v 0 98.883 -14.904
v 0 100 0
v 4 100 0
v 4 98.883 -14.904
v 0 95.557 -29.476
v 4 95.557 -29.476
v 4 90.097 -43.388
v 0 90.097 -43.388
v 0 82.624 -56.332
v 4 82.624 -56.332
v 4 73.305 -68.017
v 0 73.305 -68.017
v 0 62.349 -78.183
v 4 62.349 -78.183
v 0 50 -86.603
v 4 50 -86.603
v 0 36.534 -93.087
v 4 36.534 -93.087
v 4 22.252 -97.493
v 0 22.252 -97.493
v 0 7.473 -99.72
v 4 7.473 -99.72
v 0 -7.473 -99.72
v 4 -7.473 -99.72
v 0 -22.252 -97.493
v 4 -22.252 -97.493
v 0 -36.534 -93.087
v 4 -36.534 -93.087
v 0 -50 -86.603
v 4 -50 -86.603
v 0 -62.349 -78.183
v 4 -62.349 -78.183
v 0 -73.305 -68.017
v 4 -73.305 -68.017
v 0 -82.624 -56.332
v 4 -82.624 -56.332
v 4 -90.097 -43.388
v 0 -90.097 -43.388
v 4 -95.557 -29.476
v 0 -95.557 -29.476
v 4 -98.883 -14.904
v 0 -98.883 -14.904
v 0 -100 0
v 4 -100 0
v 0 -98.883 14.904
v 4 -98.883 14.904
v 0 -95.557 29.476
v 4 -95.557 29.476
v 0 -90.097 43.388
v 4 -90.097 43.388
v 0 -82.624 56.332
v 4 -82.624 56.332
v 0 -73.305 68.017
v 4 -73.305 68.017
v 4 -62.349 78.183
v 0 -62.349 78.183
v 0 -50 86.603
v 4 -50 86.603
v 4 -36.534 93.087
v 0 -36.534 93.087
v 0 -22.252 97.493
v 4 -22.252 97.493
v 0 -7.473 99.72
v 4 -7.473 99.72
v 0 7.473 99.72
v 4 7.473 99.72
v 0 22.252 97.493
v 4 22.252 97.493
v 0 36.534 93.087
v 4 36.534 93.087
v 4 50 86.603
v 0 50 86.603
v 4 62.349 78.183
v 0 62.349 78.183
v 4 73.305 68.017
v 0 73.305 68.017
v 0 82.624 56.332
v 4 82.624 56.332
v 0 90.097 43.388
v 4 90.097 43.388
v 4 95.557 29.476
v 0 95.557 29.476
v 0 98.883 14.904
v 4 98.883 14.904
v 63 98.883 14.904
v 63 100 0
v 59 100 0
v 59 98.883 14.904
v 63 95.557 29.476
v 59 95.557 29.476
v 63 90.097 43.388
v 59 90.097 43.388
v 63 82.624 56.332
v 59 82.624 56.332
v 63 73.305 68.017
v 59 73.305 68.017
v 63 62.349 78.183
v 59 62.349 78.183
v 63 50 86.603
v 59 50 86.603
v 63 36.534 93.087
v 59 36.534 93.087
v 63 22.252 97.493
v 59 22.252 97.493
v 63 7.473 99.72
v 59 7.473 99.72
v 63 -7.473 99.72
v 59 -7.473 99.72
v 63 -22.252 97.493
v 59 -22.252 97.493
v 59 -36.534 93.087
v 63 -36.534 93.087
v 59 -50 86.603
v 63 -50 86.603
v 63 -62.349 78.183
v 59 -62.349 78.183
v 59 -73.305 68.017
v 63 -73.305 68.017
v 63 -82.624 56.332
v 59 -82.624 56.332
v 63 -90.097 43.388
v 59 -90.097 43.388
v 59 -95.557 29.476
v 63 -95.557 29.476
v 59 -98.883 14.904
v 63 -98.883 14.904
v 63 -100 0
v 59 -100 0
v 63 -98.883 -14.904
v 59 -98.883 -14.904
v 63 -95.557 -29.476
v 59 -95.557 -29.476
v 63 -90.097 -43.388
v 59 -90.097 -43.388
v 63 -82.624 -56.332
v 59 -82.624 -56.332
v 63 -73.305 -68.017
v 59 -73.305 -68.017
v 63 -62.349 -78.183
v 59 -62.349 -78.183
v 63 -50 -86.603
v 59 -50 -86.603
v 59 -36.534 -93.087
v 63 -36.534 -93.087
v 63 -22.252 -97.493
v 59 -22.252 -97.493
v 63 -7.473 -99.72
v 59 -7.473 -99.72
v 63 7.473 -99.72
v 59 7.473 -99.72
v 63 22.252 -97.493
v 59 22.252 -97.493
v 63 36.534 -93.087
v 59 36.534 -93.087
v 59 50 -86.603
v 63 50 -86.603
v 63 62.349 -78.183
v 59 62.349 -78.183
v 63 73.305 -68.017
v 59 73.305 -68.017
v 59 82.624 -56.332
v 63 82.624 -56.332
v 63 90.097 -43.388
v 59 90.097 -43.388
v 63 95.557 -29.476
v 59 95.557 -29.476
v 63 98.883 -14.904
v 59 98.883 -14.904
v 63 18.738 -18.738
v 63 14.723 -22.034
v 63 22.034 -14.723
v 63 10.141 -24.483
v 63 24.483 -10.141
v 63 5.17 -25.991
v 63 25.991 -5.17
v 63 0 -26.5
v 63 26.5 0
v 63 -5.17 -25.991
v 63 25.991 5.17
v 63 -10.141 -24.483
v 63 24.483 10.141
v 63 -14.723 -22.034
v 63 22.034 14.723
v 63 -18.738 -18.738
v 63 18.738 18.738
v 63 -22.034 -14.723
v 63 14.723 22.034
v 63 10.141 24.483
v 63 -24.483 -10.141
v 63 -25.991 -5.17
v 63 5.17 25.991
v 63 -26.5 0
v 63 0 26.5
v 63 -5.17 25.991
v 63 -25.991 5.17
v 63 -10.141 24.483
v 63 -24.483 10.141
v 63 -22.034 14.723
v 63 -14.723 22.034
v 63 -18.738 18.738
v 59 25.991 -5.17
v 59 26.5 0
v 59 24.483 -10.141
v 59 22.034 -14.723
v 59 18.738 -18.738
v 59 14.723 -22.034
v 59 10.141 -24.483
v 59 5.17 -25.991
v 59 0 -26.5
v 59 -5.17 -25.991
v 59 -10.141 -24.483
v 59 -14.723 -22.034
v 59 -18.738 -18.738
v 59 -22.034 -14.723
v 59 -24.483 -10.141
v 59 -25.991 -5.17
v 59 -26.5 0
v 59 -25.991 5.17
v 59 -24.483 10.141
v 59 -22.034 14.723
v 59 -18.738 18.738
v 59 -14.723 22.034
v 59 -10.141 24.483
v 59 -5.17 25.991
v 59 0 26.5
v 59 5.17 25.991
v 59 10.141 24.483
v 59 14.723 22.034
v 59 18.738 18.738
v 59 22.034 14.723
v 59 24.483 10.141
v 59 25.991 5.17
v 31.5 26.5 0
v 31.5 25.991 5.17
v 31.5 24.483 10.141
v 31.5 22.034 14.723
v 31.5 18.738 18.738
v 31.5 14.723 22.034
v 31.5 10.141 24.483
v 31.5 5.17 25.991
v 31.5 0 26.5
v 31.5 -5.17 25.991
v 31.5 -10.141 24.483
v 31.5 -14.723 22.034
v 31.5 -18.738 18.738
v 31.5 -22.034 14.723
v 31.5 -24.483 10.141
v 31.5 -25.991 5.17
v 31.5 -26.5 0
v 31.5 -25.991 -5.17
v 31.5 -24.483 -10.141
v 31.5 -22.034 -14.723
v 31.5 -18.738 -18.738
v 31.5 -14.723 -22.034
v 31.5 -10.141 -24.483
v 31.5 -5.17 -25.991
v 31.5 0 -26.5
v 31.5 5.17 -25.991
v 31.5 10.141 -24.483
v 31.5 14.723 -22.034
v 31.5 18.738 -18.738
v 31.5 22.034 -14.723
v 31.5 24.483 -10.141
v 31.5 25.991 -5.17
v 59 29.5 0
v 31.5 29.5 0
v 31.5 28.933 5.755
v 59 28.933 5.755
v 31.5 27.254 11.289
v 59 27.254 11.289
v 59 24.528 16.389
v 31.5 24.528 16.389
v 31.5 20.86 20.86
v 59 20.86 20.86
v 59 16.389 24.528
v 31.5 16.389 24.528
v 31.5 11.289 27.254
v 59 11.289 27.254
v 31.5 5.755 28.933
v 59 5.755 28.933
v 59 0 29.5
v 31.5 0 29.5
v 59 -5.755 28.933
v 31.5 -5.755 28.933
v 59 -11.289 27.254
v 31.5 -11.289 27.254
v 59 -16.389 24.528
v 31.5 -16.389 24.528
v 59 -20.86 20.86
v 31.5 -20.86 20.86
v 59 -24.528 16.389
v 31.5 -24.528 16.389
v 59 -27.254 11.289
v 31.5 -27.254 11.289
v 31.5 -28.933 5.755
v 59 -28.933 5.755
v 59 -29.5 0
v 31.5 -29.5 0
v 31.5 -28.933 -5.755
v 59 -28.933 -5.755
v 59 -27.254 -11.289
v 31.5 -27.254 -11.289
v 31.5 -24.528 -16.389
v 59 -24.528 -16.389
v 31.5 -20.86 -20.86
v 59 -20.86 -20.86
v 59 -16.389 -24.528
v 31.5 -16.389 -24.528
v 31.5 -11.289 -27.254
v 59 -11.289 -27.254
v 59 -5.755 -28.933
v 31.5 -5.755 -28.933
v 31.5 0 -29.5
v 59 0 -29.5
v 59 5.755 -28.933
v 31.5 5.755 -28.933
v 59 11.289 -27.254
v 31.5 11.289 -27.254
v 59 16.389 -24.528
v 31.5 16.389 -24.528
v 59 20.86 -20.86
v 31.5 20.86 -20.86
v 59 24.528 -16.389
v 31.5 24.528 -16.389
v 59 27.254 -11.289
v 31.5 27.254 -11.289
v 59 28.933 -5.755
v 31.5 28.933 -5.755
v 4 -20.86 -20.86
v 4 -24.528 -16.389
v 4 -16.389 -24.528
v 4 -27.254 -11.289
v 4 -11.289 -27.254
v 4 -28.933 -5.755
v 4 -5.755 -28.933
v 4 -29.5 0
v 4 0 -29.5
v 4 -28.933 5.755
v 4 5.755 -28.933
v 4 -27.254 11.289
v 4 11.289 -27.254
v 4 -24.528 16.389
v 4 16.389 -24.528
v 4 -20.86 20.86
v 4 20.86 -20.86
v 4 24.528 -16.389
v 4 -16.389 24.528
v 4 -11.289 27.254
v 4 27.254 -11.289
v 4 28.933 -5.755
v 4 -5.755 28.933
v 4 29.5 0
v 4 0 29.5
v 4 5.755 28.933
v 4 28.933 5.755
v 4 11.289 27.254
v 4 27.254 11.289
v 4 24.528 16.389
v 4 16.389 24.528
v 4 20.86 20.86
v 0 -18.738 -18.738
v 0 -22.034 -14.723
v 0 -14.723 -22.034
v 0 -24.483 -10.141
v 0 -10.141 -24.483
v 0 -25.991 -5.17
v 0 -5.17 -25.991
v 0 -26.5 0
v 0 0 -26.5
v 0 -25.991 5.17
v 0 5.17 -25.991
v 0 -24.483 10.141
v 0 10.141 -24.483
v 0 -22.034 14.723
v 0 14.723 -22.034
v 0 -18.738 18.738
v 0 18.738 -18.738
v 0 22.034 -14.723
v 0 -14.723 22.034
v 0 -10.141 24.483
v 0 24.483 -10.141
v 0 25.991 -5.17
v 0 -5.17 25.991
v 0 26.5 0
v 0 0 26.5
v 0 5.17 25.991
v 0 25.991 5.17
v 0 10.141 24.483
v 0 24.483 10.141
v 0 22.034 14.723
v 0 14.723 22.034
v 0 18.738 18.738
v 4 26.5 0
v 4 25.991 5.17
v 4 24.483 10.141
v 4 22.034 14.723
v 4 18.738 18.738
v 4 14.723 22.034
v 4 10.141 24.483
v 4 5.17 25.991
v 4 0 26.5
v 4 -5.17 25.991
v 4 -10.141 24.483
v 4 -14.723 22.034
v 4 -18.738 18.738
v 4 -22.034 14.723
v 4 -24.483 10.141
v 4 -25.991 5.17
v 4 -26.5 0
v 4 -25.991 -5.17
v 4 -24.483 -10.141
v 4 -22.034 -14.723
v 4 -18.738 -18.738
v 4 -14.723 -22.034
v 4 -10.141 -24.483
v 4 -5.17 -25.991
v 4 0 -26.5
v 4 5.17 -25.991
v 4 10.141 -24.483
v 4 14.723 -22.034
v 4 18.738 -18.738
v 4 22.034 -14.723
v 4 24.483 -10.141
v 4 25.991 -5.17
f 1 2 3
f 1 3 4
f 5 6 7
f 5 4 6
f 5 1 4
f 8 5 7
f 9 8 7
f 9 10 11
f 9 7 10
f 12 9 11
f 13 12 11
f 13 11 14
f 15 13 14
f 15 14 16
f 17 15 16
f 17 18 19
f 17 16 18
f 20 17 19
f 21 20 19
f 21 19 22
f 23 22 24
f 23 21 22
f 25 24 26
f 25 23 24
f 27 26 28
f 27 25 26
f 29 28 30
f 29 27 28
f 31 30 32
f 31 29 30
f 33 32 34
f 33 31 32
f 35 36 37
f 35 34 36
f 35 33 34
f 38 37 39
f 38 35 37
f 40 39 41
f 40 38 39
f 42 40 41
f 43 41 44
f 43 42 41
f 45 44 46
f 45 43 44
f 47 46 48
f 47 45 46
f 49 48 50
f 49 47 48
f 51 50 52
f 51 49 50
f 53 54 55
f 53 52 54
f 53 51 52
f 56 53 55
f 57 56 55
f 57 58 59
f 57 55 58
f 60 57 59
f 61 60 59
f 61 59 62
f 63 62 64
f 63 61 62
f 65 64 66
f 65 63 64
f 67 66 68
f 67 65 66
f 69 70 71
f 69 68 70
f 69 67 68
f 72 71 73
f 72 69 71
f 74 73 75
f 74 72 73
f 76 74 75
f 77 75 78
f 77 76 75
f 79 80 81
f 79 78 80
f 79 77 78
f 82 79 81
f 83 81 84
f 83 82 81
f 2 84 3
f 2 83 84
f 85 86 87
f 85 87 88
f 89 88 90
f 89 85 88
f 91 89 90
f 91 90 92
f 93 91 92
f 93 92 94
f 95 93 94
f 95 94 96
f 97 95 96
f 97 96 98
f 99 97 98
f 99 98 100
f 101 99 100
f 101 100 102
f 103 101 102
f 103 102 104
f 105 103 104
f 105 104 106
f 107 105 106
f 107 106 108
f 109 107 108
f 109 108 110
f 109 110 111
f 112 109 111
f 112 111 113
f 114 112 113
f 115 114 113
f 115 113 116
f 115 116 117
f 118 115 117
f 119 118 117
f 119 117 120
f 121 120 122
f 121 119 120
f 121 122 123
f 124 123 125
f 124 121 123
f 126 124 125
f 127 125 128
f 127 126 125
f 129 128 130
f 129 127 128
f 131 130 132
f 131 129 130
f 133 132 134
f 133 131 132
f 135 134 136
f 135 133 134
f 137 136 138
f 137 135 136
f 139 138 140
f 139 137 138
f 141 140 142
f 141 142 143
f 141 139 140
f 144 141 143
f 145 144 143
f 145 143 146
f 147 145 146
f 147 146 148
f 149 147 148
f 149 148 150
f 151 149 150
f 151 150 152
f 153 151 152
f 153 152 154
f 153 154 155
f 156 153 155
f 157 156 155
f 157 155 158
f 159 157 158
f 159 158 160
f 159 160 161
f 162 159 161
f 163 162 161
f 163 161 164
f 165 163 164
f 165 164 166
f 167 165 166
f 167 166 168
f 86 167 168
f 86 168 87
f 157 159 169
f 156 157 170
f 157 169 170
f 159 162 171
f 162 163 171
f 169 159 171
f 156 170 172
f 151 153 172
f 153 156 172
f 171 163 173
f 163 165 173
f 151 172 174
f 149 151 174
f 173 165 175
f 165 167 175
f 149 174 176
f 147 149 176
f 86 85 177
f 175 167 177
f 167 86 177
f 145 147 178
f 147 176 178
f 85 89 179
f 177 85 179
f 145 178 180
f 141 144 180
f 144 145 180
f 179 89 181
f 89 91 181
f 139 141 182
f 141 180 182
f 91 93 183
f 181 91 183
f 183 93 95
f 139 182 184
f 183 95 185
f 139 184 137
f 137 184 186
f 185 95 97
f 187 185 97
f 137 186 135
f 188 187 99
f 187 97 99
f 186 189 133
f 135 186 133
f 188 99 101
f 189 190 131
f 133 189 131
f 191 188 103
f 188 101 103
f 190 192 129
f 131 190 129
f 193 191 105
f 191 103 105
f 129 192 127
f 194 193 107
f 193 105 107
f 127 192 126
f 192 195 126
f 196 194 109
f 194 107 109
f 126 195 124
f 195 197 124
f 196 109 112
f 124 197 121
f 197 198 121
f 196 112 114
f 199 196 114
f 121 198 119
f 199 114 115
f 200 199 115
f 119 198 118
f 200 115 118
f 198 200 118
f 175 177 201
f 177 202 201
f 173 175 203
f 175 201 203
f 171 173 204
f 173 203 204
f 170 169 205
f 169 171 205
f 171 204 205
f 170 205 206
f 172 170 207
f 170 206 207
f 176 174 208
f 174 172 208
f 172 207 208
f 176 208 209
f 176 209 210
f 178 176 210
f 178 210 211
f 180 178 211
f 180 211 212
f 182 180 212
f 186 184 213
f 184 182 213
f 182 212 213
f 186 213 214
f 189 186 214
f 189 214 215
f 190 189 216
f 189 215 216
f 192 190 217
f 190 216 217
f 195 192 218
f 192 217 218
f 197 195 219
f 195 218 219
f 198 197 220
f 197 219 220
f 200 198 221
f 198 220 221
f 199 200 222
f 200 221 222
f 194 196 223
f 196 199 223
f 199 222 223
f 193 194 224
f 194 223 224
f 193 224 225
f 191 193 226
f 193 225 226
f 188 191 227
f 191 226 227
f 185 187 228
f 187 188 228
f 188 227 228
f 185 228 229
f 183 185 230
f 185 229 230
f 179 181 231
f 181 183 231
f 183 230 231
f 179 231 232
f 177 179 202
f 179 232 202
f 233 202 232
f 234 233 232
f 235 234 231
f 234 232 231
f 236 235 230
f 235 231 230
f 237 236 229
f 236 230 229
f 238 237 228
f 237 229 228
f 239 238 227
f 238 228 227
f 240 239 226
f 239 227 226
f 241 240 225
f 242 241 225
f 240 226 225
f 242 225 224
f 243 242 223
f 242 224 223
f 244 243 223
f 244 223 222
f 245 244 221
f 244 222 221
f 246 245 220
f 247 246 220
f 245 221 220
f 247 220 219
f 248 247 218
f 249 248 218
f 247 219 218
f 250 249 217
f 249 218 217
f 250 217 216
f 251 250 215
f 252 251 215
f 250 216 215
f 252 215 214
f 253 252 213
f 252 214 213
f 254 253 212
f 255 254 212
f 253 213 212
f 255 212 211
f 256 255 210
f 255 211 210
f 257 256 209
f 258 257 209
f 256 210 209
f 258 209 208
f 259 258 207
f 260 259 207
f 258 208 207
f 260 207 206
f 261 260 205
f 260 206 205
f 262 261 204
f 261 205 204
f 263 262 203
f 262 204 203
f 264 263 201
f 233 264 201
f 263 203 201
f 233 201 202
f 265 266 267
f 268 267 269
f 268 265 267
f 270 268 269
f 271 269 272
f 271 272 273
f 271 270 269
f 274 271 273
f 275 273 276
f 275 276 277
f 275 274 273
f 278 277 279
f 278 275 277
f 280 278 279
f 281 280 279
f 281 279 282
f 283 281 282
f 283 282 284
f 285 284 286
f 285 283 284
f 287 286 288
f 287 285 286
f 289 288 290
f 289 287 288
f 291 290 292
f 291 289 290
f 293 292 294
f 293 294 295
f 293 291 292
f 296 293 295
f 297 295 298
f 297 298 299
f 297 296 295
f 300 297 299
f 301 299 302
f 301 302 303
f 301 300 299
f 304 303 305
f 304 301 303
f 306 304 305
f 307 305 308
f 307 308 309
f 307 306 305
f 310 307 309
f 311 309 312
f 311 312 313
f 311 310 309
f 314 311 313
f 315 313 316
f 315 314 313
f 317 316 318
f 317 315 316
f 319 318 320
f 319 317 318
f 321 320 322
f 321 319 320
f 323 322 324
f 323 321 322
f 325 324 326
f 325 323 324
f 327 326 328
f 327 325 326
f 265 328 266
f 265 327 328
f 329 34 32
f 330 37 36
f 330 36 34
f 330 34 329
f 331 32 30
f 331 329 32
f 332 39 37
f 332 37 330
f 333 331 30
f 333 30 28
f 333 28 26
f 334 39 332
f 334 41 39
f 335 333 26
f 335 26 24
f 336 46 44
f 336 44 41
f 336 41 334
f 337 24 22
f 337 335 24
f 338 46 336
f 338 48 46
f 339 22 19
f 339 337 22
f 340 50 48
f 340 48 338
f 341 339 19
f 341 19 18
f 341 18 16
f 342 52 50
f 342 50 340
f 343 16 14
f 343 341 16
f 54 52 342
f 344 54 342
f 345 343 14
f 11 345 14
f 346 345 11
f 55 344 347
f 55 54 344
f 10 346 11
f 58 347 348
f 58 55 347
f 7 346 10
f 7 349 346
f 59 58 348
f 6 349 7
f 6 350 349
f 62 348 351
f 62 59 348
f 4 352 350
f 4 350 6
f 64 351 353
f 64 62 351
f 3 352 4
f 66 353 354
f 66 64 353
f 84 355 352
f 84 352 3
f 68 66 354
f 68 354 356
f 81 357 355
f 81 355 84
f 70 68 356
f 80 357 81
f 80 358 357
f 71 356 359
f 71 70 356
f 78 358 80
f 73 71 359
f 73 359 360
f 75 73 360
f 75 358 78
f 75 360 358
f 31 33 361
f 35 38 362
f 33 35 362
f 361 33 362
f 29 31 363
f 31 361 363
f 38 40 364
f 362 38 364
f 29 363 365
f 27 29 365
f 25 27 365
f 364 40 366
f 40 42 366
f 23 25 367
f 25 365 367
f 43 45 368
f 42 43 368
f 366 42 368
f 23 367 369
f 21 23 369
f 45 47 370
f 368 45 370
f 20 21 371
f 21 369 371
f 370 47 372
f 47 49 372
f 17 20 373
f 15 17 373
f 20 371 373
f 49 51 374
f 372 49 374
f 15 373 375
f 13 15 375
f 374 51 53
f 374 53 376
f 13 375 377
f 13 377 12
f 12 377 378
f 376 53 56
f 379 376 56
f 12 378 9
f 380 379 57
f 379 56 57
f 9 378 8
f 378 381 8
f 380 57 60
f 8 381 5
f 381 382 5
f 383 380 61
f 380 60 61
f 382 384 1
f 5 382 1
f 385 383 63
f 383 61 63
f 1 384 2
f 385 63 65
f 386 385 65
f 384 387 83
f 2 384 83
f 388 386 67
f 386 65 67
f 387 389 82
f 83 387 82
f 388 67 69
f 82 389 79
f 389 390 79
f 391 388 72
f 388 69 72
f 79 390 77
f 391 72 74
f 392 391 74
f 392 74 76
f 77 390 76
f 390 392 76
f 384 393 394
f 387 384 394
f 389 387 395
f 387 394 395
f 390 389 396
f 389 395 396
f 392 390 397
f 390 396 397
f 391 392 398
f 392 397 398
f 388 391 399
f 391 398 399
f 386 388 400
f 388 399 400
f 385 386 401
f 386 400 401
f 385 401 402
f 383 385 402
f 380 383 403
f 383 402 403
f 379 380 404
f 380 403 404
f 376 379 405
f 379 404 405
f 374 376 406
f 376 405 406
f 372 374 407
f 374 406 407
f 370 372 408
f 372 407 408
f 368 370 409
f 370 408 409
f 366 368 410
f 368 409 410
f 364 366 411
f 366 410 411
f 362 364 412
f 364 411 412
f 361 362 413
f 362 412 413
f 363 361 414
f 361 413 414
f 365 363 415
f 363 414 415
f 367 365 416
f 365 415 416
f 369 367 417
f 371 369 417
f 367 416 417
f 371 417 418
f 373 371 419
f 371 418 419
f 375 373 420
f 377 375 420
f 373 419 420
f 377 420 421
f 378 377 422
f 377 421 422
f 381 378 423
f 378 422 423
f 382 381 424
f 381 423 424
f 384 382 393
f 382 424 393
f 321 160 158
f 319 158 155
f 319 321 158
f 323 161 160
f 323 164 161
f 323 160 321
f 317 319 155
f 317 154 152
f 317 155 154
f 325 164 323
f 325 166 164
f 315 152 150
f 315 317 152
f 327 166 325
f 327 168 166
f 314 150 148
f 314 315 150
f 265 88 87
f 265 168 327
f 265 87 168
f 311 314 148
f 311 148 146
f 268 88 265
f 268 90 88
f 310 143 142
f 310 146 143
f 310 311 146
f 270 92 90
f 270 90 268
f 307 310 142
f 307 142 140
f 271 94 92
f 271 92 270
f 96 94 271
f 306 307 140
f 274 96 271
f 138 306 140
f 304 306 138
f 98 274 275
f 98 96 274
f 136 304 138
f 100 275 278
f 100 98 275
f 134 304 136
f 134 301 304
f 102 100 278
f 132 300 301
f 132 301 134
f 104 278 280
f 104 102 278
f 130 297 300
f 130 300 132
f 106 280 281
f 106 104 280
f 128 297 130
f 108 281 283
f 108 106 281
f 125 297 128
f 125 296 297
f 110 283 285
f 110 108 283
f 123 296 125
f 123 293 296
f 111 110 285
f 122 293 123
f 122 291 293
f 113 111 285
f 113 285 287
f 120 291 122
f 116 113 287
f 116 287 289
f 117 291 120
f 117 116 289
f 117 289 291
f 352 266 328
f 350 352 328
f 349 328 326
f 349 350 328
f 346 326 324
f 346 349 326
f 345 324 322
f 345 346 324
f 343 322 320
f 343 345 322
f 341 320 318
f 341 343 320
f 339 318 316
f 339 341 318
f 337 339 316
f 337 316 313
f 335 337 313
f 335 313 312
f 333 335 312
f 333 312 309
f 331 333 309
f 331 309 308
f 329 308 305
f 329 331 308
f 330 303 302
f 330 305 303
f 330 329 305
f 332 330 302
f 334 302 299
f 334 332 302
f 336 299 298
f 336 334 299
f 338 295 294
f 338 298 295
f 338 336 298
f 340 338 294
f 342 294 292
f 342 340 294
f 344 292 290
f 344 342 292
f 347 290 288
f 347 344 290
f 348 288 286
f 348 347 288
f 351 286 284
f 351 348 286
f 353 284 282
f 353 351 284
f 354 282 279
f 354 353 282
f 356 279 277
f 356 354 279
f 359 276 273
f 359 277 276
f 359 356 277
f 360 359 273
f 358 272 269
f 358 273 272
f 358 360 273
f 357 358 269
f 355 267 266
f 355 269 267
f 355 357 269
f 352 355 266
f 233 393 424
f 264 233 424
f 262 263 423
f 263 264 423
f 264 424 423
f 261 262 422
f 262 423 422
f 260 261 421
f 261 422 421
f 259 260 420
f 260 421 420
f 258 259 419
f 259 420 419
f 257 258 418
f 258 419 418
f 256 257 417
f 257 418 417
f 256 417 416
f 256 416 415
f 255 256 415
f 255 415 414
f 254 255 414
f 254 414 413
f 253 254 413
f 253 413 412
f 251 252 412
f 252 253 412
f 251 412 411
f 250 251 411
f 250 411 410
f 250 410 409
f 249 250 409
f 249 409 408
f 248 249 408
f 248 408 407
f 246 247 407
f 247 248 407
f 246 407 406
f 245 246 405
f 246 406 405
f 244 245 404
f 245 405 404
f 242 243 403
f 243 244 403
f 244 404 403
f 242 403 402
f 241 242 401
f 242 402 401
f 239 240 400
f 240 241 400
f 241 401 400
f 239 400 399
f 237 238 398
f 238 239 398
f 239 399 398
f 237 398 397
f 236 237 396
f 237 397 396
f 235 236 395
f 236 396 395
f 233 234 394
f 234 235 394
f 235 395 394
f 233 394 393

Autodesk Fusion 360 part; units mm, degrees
sketch "Sketch1" plane through (0, 0, 0) normal (1, 0, 0) x (0, 1, 0)
  circle A0 centre (0, 0) radius 100
  dimension "d1" = 200
extrude "Extrude1" add sketch "Sketch1" along normal blind 4
sketch "Sketch2" plane through (4, 0, 0) normal (1, 0, 0) x (0, 1, 0)
  circle A0 centre (0, 0) radius 100
  circle A1 centre (0, 0) radius 26.5
  circle A2 centre (0, 0) radius 29.5
  dimension "d4" = 53
  dimension "d5" = 3
extrude "Extrude2" add sketch "Sketch2" along normal blind 27.5 contours A2
extrude "Extrude3" cut 1 faces at (4, -6.4753, 6.0082) along direction (-1, 0, 0) blind 40
mirror "Mirror1" about plane through (31.5, 0, 0) normal (1, 0, 0) of bodies 1 merged
